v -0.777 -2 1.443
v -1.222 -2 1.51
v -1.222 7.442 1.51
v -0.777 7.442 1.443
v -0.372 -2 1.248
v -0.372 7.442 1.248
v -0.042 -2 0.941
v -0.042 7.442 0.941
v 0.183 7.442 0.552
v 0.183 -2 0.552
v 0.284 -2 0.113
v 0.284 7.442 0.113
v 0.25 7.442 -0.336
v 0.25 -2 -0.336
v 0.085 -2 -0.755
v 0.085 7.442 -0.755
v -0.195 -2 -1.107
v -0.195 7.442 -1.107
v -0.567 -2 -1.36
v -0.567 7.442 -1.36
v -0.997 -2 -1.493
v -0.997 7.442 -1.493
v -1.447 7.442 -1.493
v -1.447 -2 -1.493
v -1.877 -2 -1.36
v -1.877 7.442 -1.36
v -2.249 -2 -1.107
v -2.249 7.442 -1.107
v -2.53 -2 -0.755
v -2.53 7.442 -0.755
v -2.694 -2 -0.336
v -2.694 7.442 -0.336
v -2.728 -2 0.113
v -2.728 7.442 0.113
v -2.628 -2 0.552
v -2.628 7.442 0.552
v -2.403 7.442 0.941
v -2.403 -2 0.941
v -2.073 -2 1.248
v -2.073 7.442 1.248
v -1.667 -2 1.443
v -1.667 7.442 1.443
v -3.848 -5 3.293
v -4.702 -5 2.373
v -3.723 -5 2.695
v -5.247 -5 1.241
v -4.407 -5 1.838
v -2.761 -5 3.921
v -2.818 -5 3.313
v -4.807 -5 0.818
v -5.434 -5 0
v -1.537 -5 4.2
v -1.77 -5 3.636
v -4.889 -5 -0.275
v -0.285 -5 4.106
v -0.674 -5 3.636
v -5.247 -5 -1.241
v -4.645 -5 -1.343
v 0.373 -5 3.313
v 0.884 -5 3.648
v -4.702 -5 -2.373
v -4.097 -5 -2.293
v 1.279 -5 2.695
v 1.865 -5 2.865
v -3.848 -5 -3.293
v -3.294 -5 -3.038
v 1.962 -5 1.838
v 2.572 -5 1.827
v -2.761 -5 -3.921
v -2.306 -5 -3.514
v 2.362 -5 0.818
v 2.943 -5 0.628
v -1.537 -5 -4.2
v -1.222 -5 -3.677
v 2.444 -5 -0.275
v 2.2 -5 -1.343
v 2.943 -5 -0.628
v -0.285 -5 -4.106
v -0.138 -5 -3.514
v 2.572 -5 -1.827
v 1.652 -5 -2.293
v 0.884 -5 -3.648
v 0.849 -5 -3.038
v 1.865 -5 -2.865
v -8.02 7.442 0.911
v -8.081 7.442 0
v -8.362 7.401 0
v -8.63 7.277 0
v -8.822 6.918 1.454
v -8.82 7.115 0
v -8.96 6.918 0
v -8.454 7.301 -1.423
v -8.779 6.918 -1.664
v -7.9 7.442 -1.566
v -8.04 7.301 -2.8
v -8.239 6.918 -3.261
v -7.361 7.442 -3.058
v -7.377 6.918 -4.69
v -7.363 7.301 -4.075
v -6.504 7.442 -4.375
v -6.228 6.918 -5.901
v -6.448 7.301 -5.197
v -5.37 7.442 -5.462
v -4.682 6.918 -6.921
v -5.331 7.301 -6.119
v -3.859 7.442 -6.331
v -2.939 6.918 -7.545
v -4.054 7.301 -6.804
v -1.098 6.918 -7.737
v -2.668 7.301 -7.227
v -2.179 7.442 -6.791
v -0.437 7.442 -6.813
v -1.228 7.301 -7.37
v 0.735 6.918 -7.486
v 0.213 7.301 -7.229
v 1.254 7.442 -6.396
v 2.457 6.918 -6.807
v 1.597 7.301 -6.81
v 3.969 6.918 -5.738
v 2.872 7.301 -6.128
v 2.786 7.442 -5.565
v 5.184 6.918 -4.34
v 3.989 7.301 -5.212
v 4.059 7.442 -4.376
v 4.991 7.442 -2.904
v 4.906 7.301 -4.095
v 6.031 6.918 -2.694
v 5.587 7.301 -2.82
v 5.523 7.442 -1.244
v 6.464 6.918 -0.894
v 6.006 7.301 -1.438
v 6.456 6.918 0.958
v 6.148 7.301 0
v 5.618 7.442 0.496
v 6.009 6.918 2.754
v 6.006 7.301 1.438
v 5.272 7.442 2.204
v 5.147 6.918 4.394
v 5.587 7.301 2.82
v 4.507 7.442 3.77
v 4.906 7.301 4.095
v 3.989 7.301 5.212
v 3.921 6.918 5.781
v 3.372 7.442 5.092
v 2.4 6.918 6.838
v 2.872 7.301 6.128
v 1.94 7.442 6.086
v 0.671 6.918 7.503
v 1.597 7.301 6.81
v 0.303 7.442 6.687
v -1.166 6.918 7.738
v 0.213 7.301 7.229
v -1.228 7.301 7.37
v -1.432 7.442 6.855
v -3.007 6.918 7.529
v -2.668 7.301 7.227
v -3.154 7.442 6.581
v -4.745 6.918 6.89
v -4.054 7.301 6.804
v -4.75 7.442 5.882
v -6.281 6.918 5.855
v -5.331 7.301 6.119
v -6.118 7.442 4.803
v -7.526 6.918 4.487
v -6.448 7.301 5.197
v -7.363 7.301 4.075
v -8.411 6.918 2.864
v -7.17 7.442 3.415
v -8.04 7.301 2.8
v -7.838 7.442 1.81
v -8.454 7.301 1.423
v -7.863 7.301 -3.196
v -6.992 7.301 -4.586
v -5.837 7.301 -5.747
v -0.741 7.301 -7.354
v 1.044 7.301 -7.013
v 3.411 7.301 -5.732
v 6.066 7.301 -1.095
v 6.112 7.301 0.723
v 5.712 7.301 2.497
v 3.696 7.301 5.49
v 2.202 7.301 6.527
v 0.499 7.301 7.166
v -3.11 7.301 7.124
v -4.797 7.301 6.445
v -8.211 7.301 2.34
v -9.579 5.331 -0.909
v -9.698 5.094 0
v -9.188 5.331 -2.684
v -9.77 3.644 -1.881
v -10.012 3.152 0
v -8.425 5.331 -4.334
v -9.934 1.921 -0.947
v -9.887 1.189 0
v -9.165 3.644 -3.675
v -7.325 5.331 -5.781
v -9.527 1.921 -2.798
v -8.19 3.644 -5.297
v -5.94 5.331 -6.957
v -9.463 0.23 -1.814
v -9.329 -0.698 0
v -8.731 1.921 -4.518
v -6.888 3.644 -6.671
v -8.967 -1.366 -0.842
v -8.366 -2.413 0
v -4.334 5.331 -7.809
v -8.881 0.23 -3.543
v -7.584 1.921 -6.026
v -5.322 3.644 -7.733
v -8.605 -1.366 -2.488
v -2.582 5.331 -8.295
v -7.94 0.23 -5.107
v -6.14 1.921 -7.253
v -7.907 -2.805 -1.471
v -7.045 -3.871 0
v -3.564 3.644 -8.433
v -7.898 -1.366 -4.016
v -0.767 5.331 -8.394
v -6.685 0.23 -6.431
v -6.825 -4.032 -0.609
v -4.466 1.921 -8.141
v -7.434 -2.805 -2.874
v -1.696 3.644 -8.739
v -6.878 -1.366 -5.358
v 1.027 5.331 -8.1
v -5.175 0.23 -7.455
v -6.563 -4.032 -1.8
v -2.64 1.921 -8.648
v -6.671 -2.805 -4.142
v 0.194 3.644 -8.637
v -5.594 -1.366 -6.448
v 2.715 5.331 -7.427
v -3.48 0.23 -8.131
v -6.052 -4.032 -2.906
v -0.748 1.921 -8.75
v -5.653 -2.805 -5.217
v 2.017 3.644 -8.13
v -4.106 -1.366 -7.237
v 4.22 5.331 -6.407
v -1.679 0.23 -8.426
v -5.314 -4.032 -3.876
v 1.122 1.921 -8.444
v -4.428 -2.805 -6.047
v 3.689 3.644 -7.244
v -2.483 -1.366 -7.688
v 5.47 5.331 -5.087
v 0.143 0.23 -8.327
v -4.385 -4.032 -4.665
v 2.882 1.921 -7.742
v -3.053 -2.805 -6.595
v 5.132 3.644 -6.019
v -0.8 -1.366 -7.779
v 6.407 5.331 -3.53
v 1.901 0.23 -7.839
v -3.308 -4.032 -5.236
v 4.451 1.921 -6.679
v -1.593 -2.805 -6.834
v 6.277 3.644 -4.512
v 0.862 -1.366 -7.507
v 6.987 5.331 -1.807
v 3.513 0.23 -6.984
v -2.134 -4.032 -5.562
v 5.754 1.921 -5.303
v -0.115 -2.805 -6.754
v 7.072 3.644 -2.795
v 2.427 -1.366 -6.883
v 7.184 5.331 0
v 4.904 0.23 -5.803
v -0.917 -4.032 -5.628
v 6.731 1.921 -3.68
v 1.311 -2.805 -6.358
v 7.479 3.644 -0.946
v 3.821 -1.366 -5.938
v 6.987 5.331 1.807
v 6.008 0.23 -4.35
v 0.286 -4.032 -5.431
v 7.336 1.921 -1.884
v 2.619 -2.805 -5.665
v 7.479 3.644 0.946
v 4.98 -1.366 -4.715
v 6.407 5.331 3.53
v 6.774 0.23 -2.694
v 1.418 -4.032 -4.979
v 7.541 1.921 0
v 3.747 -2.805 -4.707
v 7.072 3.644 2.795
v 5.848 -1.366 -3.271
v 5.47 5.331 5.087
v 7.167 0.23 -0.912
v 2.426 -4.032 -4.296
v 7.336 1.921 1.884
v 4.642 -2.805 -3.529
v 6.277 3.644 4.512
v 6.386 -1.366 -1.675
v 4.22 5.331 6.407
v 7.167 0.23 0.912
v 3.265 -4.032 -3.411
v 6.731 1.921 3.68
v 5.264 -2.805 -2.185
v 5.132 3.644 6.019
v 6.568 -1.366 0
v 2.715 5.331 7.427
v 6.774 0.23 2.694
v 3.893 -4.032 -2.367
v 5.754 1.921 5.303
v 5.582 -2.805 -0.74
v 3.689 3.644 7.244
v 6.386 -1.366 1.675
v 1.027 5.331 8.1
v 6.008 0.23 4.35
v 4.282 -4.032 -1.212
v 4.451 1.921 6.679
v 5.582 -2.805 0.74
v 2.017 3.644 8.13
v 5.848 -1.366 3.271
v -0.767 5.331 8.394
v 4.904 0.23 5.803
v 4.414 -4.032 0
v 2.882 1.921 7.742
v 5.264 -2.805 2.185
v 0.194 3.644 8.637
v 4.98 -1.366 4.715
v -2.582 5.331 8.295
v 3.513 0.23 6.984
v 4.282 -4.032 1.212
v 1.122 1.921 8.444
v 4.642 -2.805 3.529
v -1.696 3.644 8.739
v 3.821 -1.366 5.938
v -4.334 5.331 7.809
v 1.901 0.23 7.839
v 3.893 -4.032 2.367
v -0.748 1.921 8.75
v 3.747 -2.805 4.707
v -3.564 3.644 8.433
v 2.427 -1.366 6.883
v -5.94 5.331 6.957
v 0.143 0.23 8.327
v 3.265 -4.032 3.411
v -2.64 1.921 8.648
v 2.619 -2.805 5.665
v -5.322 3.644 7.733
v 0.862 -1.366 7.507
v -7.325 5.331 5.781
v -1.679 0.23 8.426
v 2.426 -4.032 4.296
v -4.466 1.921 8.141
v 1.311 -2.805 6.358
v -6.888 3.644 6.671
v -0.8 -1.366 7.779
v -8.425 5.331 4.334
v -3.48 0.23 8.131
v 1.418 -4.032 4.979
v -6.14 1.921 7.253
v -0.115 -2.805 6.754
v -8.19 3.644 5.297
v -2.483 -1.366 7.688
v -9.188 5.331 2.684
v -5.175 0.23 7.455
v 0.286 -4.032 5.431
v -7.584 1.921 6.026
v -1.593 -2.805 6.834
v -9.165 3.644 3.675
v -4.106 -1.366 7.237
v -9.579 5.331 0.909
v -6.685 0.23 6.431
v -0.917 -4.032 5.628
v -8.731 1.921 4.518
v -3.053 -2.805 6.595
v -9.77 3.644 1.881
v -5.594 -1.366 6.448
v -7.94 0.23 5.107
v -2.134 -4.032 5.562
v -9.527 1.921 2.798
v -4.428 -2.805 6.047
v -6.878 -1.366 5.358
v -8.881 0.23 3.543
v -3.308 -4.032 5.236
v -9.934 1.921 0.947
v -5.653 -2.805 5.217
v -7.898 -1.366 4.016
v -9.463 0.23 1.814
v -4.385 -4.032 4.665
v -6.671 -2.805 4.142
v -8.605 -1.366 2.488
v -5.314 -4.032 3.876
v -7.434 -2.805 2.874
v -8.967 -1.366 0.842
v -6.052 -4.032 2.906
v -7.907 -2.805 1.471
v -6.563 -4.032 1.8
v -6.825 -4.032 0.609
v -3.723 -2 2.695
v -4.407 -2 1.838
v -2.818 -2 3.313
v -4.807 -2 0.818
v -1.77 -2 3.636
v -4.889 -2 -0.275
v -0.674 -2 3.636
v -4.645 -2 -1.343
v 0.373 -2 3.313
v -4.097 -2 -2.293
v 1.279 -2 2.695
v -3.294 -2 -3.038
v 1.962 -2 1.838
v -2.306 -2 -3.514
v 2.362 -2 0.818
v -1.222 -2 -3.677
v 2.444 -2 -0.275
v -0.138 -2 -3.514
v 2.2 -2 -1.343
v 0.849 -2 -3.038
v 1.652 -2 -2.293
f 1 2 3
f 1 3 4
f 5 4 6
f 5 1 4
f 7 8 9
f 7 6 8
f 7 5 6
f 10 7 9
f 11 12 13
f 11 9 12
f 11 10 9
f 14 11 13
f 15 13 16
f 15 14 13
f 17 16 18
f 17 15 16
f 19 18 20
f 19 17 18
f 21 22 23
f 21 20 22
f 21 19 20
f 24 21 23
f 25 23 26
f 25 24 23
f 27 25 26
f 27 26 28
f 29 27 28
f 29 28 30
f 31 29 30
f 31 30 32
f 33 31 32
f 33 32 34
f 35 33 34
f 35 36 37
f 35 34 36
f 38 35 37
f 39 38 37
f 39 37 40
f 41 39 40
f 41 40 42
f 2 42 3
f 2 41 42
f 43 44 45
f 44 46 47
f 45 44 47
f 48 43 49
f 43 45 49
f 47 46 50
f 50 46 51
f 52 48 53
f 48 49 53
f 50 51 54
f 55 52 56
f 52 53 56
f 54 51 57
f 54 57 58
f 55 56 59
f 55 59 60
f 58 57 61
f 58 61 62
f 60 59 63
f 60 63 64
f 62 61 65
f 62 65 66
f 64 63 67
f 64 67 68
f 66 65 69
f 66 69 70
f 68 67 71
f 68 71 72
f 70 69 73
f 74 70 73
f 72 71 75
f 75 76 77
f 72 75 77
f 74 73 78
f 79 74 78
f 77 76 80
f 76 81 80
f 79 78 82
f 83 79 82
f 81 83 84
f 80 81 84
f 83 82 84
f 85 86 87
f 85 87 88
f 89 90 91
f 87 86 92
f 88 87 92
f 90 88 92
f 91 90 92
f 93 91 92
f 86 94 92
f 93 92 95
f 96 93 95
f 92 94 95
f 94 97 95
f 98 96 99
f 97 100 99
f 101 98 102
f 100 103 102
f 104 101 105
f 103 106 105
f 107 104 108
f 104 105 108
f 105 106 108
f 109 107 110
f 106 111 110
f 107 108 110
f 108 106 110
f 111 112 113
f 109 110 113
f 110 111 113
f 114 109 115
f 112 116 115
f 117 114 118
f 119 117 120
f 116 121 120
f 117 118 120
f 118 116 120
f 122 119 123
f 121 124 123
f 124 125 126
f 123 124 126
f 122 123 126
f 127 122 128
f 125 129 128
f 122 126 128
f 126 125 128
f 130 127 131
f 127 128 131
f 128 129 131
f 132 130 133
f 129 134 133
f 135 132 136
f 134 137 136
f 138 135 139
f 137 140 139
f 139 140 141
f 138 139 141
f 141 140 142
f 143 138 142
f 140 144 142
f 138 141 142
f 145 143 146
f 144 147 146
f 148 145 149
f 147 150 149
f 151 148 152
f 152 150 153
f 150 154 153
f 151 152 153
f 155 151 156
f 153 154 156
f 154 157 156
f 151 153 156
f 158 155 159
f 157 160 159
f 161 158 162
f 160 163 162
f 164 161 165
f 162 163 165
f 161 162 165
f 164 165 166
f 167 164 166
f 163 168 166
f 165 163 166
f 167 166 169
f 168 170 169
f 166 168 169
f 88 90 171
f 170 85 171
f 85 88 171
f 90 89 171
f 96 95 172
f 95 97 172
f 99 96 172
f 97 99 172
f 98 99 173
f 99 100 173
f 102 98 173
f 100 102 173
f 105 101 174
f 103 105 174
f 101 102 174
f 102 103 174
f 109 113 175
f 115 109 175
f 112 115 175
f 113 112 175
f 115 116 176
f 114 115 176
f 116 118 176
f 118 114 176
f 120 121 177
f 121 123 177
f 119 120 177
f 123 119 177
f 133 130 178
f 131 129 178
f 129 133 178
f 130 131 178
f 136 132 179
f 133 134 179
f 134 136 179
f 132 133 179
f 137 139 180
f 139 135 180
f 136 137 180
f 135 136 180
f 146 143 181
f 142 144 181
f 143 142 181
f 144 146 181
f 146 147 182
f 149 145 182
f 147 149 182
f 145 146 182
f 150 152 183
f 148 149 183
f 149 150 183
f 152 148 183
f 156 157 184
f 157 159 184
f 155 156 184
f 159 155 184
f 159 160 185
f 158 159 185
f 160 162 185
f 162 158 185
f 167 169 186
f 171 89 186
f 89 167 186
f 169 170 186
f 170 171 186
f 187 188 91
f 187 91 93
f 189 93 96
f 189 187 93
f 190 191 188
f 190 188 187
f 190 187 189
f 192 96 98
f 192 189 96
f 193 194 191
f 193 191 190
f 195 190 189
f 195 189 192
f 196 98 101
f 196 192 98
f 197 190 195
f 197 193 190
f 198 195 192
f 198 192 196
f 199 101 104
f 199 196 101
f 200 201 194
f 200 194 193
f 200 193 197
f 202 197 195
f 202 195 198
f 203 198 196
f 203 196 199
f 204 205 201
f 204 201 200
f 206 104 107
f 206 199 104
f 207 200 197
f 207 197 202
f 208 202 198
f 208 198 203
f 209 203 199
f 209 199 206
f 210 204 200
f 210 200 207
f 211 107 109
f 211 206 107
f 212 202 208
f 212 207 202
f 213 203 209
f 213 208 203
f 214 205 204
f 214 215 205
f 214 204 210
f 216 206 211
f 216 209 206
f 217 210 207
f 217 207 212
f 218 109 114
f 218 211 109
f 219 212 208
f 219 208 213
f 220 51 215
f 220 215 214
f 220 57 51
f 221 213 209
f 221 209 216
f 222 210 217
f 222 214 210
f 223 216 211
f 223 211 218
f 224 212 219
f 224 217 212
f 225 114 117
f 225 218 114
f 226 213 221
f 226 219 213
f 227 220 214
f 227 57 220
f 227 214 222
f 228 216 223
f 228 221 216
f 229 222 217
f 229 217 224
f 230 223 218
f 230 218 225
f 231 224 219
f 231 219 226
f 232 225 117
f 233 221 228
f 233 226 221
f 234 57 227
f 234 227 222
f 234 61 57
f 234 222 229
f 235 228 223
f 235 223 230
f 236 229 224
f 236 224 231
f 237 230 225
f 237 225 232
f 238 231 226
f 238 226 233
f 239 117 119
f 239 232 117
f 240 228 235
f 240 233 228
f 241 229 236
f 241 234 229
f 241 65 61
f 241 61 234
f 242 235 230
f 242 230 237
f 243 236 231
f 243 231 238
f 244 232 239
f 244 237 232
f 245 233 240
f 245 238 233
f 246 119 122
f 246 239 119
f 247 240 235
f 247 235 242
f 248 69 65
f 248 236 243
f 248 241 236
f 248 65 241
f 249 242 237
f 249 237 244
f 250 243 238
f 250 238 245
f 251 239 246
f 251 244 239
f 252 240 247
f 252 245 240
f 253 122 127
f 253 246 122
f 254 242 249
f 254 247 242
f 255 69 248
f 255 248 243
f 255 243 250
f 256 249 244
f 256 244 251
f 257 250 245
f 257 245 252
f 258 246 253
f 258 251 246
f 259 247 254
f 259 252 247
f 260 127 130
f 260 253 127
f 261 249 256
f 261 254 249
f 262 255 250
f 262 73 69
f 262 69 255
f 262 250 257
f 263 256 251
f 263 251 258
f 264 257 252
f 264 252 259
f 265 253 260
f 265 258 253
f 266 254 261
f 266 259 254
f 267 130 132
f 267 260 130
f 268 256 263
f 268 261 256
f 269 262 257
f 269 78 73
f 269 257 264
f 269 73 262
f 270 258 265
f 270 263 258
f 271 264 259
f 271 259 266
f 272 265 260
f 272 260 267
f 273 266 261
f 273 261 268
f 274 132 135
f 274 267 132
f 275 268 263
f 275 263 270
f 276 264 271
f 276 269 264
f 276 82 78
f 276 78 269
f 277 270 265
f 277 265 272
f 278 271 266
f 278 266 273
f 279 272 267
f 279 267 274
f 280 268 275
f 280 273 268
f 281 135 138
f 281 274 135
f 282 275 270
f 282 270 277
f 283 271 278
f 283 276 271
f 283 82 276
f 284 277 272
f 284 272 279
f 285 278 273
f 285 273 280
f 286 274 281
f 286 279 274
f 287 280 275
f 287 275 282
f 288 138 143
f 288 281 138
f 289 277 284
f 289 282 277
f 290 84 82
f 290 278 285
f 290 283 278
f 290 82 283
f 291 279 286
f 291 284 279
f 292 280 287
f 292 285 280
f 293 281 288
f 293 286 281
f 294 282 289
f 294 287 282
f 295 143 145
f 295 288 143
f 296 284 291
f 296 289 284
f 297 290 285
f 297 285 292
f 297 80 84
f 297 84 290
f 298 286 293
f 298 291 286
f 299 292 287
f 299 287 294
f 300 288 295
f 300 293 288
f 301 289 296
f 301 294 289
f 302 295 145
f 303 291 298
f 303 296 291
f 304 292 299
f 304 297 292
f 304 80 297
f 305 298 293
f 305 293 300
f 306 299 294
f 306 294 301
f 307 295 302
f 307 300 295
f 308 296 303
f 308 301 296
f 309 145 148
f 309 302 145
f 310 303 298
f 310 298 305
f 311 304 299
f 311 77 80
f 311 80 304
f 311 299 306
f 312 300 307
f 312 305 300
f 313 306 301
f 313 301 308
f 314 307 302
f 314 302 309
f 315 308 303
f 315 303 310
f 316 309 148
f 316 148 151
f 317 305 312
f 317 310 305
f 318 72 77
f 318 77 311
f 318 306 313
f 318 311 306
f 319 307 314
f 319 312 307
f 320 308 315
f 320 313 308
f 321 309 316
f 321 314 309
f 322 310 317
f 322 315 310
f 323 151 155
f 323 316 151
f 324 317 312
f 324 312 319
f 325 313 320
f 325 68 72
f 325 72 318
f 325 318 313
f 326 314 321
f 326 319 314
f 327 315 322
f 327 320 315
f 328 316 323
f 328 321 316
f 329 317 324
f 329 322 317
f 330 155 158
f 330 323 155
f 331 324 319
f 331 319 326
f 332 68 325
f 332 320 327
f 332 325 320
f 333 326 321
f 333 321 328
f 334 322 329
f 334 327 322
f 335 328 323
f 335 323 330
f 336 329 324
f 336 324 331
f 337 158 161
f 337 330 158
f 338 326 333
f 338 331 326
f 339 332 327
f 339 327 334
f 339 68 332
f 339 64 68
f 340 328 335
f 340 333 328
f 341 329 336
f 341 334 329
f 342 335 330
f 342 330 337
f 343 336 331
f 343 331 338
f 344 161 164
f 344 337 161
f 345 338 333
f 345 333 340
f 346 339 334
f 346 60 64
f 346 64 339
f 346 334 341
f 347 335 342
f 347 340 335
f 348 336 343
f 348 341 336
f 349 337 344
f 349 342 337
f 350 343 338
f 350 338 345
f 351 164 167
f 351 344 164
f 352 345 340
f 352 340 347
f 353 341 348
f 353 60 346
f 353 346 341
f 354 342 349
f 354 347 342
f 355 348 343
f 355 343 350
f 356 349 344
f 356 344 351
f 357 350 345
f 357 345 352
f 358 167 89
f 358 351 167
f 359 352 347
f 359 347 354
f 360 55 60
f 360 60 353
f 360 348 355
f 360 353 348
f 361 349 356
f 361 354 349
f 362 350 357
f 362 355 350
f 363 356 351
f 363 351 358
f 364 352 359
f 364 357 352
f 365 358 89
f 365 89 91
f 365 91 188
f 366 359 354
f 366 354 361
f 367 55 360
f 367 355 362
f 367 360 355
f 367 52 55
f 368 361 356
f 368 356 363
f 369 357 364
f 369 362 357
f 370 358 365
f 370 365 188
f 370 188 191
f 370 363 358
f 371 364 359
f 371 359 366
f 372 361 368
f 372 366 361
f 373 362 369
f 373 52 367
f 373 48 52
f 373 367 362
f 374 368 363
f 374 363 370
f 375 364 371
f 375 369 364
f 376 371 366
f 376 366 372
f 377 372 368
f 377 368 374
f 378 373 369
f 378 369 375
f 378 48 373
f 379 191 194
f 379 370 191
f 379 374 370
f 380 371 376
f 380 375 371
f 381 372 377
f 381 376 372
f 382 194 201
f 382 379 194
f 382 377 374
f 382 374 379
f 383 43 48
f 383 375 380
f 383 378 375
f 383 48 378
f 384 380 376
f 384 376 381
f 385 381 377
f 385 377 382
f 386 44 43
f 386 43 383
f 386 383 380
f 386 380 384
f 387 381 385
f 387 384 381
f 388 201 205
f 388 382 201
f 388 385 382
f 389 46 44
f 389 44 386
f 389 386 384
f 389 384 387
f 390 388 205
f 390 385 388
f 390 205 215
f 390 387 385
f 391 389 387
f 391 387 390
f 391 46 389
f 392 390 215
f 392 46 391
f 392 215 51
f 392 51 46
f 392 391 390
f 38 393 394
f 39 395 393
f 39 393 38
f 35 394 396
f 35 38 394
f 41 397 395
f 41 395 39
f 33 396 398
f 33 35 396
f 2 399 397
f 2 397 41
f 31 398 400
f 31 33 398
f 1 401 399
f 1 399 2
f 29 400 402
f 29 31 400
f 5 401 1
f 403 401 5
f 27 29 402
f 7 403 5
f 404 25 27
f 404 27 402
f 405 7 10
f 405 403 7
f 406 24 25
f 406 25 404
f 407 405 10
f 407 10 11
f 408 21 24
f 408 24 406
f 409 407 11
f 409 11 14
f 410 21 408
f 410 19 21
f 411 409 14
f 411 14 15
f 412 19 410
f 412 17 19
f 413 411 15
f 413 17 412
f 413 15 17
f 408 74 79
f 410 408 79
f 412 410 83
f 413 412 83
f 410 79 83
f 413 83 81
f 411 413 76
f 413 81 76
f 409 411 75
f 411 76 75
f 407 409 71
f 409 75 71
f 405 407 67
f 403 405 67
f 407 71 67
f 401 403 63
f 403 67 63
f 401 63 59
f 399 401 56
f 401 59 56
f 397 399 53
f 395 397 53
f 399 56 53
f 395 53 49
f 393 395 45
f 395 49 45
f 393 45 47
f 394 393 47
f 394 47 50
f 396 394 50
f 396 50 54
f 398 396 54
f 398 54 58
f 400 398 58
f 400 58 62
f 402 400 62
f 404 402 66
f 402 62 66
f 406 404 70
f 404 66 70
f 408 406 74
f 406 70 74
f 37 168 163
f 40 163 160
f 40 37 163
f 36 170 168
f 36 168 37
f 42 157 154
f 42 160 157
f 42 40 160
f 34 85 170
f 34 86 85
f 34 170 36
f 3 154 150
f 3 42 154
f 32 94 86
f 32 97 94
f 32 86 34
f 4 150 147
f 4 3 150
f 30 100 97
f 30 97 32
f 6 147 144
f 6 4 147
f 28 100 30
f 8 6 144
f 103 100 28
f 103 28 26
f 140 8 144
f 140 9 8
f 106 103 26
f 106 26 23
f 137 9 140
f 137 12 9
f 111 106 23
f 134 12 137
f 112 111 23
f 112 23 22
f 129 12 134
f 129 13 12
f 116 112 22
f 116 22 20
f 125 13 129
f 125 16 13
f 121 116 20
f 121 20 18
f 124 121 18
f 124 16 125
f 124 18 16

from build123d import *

# Parameters (mm, degrees)
CUT_EXTRUDE_1_DEPTH      = 19.987901745
CUT_EXTRUDE_1_DEPTH_BACK = 19.987901745
SKETCH_2_R               = 1.51
SKETCH_4_R               = 4.643686352
CUT_EXTRUDE_2_DEPTH      = 5
SKETCH_5_R               = 3.676903301
CUT_EXTRUDE_3_DEPTH      = 3
FILLET_1_R               = 1


with BuildPart() as part:
    # 草图1 → 旋转1 (revolve)
    with BuildSketch(Plane.XY):
        with BuildLine():
            Line((-1.222258531, -6.073377549), (-1.222258531, 7.441604752))
            Line((-1.222258531, 7.441604752), (-8.652530525, 7.441604752))
            ThreePointArc((-8.652530525, 7.441604752), (-8.933673585, -1.512962184), (-1.222258531, -6.073377549))
        make_face()
    revolve(axis=Axis((-1.222258531, 5.226622451, 0), (0, -1, 0)))

    # 草图2 → 切除-拉伸1 (cut, two sides: drawn at the far end of the back side and taken through both)
    with BuildSketch(Plane(origin=(0, 7.441604752, 0), x_dir=(1, 0, 0), z_dir=(0, 1, 0)).offset(-CUT_EXTRUDE_1_DEPTH_BACK)):
        with Locations(Location((-1.222258531, 0, 0), (0, 0, 270))):
            Circle(SKETCH_2_R)
    extrude(amount=CUT_EXTRUDE_1_DEPTH + CUT_EXTRUDE_1_DEPTH_BACK, mode=Mode.SUBTRACT)

    # 草图4 → 切除-拉伸2 (cut)
    with BuildSketch(Plane(origin=(0, -10, 0), x_dir=(1, 0, 0), z_dir=(0, 1, 0))):
        with Locations((-1.222258531, 0)):
            Circle(SKETCH_4_R)
    extrude(amount=CUT_EXTRUDE_2_DEPTH, mode=Mode.SUBTRACT)

    # 草图5 → 切除-拉伸3 (cut)
    with BuildSketch(Plane.XZ.offset(5)):
        with Locations(Location((-1.222258531, 0, 0), (0, 0, 270))):
            Circle(SKETCH_5_R)
    extrude(amount=-CUT_EXTRUDE_3_DEPTH, mode=Mode.SUBTRACT)

    # 圆角1
    fillet_1_edges = [part.edges().sort_by_distance(p)[0] for p in [
        (6.208013462, 7.441604752, 0),
    ]]
    fillet(fillet_1_edges, radius=FILLET_1_R)


solid = part.part
